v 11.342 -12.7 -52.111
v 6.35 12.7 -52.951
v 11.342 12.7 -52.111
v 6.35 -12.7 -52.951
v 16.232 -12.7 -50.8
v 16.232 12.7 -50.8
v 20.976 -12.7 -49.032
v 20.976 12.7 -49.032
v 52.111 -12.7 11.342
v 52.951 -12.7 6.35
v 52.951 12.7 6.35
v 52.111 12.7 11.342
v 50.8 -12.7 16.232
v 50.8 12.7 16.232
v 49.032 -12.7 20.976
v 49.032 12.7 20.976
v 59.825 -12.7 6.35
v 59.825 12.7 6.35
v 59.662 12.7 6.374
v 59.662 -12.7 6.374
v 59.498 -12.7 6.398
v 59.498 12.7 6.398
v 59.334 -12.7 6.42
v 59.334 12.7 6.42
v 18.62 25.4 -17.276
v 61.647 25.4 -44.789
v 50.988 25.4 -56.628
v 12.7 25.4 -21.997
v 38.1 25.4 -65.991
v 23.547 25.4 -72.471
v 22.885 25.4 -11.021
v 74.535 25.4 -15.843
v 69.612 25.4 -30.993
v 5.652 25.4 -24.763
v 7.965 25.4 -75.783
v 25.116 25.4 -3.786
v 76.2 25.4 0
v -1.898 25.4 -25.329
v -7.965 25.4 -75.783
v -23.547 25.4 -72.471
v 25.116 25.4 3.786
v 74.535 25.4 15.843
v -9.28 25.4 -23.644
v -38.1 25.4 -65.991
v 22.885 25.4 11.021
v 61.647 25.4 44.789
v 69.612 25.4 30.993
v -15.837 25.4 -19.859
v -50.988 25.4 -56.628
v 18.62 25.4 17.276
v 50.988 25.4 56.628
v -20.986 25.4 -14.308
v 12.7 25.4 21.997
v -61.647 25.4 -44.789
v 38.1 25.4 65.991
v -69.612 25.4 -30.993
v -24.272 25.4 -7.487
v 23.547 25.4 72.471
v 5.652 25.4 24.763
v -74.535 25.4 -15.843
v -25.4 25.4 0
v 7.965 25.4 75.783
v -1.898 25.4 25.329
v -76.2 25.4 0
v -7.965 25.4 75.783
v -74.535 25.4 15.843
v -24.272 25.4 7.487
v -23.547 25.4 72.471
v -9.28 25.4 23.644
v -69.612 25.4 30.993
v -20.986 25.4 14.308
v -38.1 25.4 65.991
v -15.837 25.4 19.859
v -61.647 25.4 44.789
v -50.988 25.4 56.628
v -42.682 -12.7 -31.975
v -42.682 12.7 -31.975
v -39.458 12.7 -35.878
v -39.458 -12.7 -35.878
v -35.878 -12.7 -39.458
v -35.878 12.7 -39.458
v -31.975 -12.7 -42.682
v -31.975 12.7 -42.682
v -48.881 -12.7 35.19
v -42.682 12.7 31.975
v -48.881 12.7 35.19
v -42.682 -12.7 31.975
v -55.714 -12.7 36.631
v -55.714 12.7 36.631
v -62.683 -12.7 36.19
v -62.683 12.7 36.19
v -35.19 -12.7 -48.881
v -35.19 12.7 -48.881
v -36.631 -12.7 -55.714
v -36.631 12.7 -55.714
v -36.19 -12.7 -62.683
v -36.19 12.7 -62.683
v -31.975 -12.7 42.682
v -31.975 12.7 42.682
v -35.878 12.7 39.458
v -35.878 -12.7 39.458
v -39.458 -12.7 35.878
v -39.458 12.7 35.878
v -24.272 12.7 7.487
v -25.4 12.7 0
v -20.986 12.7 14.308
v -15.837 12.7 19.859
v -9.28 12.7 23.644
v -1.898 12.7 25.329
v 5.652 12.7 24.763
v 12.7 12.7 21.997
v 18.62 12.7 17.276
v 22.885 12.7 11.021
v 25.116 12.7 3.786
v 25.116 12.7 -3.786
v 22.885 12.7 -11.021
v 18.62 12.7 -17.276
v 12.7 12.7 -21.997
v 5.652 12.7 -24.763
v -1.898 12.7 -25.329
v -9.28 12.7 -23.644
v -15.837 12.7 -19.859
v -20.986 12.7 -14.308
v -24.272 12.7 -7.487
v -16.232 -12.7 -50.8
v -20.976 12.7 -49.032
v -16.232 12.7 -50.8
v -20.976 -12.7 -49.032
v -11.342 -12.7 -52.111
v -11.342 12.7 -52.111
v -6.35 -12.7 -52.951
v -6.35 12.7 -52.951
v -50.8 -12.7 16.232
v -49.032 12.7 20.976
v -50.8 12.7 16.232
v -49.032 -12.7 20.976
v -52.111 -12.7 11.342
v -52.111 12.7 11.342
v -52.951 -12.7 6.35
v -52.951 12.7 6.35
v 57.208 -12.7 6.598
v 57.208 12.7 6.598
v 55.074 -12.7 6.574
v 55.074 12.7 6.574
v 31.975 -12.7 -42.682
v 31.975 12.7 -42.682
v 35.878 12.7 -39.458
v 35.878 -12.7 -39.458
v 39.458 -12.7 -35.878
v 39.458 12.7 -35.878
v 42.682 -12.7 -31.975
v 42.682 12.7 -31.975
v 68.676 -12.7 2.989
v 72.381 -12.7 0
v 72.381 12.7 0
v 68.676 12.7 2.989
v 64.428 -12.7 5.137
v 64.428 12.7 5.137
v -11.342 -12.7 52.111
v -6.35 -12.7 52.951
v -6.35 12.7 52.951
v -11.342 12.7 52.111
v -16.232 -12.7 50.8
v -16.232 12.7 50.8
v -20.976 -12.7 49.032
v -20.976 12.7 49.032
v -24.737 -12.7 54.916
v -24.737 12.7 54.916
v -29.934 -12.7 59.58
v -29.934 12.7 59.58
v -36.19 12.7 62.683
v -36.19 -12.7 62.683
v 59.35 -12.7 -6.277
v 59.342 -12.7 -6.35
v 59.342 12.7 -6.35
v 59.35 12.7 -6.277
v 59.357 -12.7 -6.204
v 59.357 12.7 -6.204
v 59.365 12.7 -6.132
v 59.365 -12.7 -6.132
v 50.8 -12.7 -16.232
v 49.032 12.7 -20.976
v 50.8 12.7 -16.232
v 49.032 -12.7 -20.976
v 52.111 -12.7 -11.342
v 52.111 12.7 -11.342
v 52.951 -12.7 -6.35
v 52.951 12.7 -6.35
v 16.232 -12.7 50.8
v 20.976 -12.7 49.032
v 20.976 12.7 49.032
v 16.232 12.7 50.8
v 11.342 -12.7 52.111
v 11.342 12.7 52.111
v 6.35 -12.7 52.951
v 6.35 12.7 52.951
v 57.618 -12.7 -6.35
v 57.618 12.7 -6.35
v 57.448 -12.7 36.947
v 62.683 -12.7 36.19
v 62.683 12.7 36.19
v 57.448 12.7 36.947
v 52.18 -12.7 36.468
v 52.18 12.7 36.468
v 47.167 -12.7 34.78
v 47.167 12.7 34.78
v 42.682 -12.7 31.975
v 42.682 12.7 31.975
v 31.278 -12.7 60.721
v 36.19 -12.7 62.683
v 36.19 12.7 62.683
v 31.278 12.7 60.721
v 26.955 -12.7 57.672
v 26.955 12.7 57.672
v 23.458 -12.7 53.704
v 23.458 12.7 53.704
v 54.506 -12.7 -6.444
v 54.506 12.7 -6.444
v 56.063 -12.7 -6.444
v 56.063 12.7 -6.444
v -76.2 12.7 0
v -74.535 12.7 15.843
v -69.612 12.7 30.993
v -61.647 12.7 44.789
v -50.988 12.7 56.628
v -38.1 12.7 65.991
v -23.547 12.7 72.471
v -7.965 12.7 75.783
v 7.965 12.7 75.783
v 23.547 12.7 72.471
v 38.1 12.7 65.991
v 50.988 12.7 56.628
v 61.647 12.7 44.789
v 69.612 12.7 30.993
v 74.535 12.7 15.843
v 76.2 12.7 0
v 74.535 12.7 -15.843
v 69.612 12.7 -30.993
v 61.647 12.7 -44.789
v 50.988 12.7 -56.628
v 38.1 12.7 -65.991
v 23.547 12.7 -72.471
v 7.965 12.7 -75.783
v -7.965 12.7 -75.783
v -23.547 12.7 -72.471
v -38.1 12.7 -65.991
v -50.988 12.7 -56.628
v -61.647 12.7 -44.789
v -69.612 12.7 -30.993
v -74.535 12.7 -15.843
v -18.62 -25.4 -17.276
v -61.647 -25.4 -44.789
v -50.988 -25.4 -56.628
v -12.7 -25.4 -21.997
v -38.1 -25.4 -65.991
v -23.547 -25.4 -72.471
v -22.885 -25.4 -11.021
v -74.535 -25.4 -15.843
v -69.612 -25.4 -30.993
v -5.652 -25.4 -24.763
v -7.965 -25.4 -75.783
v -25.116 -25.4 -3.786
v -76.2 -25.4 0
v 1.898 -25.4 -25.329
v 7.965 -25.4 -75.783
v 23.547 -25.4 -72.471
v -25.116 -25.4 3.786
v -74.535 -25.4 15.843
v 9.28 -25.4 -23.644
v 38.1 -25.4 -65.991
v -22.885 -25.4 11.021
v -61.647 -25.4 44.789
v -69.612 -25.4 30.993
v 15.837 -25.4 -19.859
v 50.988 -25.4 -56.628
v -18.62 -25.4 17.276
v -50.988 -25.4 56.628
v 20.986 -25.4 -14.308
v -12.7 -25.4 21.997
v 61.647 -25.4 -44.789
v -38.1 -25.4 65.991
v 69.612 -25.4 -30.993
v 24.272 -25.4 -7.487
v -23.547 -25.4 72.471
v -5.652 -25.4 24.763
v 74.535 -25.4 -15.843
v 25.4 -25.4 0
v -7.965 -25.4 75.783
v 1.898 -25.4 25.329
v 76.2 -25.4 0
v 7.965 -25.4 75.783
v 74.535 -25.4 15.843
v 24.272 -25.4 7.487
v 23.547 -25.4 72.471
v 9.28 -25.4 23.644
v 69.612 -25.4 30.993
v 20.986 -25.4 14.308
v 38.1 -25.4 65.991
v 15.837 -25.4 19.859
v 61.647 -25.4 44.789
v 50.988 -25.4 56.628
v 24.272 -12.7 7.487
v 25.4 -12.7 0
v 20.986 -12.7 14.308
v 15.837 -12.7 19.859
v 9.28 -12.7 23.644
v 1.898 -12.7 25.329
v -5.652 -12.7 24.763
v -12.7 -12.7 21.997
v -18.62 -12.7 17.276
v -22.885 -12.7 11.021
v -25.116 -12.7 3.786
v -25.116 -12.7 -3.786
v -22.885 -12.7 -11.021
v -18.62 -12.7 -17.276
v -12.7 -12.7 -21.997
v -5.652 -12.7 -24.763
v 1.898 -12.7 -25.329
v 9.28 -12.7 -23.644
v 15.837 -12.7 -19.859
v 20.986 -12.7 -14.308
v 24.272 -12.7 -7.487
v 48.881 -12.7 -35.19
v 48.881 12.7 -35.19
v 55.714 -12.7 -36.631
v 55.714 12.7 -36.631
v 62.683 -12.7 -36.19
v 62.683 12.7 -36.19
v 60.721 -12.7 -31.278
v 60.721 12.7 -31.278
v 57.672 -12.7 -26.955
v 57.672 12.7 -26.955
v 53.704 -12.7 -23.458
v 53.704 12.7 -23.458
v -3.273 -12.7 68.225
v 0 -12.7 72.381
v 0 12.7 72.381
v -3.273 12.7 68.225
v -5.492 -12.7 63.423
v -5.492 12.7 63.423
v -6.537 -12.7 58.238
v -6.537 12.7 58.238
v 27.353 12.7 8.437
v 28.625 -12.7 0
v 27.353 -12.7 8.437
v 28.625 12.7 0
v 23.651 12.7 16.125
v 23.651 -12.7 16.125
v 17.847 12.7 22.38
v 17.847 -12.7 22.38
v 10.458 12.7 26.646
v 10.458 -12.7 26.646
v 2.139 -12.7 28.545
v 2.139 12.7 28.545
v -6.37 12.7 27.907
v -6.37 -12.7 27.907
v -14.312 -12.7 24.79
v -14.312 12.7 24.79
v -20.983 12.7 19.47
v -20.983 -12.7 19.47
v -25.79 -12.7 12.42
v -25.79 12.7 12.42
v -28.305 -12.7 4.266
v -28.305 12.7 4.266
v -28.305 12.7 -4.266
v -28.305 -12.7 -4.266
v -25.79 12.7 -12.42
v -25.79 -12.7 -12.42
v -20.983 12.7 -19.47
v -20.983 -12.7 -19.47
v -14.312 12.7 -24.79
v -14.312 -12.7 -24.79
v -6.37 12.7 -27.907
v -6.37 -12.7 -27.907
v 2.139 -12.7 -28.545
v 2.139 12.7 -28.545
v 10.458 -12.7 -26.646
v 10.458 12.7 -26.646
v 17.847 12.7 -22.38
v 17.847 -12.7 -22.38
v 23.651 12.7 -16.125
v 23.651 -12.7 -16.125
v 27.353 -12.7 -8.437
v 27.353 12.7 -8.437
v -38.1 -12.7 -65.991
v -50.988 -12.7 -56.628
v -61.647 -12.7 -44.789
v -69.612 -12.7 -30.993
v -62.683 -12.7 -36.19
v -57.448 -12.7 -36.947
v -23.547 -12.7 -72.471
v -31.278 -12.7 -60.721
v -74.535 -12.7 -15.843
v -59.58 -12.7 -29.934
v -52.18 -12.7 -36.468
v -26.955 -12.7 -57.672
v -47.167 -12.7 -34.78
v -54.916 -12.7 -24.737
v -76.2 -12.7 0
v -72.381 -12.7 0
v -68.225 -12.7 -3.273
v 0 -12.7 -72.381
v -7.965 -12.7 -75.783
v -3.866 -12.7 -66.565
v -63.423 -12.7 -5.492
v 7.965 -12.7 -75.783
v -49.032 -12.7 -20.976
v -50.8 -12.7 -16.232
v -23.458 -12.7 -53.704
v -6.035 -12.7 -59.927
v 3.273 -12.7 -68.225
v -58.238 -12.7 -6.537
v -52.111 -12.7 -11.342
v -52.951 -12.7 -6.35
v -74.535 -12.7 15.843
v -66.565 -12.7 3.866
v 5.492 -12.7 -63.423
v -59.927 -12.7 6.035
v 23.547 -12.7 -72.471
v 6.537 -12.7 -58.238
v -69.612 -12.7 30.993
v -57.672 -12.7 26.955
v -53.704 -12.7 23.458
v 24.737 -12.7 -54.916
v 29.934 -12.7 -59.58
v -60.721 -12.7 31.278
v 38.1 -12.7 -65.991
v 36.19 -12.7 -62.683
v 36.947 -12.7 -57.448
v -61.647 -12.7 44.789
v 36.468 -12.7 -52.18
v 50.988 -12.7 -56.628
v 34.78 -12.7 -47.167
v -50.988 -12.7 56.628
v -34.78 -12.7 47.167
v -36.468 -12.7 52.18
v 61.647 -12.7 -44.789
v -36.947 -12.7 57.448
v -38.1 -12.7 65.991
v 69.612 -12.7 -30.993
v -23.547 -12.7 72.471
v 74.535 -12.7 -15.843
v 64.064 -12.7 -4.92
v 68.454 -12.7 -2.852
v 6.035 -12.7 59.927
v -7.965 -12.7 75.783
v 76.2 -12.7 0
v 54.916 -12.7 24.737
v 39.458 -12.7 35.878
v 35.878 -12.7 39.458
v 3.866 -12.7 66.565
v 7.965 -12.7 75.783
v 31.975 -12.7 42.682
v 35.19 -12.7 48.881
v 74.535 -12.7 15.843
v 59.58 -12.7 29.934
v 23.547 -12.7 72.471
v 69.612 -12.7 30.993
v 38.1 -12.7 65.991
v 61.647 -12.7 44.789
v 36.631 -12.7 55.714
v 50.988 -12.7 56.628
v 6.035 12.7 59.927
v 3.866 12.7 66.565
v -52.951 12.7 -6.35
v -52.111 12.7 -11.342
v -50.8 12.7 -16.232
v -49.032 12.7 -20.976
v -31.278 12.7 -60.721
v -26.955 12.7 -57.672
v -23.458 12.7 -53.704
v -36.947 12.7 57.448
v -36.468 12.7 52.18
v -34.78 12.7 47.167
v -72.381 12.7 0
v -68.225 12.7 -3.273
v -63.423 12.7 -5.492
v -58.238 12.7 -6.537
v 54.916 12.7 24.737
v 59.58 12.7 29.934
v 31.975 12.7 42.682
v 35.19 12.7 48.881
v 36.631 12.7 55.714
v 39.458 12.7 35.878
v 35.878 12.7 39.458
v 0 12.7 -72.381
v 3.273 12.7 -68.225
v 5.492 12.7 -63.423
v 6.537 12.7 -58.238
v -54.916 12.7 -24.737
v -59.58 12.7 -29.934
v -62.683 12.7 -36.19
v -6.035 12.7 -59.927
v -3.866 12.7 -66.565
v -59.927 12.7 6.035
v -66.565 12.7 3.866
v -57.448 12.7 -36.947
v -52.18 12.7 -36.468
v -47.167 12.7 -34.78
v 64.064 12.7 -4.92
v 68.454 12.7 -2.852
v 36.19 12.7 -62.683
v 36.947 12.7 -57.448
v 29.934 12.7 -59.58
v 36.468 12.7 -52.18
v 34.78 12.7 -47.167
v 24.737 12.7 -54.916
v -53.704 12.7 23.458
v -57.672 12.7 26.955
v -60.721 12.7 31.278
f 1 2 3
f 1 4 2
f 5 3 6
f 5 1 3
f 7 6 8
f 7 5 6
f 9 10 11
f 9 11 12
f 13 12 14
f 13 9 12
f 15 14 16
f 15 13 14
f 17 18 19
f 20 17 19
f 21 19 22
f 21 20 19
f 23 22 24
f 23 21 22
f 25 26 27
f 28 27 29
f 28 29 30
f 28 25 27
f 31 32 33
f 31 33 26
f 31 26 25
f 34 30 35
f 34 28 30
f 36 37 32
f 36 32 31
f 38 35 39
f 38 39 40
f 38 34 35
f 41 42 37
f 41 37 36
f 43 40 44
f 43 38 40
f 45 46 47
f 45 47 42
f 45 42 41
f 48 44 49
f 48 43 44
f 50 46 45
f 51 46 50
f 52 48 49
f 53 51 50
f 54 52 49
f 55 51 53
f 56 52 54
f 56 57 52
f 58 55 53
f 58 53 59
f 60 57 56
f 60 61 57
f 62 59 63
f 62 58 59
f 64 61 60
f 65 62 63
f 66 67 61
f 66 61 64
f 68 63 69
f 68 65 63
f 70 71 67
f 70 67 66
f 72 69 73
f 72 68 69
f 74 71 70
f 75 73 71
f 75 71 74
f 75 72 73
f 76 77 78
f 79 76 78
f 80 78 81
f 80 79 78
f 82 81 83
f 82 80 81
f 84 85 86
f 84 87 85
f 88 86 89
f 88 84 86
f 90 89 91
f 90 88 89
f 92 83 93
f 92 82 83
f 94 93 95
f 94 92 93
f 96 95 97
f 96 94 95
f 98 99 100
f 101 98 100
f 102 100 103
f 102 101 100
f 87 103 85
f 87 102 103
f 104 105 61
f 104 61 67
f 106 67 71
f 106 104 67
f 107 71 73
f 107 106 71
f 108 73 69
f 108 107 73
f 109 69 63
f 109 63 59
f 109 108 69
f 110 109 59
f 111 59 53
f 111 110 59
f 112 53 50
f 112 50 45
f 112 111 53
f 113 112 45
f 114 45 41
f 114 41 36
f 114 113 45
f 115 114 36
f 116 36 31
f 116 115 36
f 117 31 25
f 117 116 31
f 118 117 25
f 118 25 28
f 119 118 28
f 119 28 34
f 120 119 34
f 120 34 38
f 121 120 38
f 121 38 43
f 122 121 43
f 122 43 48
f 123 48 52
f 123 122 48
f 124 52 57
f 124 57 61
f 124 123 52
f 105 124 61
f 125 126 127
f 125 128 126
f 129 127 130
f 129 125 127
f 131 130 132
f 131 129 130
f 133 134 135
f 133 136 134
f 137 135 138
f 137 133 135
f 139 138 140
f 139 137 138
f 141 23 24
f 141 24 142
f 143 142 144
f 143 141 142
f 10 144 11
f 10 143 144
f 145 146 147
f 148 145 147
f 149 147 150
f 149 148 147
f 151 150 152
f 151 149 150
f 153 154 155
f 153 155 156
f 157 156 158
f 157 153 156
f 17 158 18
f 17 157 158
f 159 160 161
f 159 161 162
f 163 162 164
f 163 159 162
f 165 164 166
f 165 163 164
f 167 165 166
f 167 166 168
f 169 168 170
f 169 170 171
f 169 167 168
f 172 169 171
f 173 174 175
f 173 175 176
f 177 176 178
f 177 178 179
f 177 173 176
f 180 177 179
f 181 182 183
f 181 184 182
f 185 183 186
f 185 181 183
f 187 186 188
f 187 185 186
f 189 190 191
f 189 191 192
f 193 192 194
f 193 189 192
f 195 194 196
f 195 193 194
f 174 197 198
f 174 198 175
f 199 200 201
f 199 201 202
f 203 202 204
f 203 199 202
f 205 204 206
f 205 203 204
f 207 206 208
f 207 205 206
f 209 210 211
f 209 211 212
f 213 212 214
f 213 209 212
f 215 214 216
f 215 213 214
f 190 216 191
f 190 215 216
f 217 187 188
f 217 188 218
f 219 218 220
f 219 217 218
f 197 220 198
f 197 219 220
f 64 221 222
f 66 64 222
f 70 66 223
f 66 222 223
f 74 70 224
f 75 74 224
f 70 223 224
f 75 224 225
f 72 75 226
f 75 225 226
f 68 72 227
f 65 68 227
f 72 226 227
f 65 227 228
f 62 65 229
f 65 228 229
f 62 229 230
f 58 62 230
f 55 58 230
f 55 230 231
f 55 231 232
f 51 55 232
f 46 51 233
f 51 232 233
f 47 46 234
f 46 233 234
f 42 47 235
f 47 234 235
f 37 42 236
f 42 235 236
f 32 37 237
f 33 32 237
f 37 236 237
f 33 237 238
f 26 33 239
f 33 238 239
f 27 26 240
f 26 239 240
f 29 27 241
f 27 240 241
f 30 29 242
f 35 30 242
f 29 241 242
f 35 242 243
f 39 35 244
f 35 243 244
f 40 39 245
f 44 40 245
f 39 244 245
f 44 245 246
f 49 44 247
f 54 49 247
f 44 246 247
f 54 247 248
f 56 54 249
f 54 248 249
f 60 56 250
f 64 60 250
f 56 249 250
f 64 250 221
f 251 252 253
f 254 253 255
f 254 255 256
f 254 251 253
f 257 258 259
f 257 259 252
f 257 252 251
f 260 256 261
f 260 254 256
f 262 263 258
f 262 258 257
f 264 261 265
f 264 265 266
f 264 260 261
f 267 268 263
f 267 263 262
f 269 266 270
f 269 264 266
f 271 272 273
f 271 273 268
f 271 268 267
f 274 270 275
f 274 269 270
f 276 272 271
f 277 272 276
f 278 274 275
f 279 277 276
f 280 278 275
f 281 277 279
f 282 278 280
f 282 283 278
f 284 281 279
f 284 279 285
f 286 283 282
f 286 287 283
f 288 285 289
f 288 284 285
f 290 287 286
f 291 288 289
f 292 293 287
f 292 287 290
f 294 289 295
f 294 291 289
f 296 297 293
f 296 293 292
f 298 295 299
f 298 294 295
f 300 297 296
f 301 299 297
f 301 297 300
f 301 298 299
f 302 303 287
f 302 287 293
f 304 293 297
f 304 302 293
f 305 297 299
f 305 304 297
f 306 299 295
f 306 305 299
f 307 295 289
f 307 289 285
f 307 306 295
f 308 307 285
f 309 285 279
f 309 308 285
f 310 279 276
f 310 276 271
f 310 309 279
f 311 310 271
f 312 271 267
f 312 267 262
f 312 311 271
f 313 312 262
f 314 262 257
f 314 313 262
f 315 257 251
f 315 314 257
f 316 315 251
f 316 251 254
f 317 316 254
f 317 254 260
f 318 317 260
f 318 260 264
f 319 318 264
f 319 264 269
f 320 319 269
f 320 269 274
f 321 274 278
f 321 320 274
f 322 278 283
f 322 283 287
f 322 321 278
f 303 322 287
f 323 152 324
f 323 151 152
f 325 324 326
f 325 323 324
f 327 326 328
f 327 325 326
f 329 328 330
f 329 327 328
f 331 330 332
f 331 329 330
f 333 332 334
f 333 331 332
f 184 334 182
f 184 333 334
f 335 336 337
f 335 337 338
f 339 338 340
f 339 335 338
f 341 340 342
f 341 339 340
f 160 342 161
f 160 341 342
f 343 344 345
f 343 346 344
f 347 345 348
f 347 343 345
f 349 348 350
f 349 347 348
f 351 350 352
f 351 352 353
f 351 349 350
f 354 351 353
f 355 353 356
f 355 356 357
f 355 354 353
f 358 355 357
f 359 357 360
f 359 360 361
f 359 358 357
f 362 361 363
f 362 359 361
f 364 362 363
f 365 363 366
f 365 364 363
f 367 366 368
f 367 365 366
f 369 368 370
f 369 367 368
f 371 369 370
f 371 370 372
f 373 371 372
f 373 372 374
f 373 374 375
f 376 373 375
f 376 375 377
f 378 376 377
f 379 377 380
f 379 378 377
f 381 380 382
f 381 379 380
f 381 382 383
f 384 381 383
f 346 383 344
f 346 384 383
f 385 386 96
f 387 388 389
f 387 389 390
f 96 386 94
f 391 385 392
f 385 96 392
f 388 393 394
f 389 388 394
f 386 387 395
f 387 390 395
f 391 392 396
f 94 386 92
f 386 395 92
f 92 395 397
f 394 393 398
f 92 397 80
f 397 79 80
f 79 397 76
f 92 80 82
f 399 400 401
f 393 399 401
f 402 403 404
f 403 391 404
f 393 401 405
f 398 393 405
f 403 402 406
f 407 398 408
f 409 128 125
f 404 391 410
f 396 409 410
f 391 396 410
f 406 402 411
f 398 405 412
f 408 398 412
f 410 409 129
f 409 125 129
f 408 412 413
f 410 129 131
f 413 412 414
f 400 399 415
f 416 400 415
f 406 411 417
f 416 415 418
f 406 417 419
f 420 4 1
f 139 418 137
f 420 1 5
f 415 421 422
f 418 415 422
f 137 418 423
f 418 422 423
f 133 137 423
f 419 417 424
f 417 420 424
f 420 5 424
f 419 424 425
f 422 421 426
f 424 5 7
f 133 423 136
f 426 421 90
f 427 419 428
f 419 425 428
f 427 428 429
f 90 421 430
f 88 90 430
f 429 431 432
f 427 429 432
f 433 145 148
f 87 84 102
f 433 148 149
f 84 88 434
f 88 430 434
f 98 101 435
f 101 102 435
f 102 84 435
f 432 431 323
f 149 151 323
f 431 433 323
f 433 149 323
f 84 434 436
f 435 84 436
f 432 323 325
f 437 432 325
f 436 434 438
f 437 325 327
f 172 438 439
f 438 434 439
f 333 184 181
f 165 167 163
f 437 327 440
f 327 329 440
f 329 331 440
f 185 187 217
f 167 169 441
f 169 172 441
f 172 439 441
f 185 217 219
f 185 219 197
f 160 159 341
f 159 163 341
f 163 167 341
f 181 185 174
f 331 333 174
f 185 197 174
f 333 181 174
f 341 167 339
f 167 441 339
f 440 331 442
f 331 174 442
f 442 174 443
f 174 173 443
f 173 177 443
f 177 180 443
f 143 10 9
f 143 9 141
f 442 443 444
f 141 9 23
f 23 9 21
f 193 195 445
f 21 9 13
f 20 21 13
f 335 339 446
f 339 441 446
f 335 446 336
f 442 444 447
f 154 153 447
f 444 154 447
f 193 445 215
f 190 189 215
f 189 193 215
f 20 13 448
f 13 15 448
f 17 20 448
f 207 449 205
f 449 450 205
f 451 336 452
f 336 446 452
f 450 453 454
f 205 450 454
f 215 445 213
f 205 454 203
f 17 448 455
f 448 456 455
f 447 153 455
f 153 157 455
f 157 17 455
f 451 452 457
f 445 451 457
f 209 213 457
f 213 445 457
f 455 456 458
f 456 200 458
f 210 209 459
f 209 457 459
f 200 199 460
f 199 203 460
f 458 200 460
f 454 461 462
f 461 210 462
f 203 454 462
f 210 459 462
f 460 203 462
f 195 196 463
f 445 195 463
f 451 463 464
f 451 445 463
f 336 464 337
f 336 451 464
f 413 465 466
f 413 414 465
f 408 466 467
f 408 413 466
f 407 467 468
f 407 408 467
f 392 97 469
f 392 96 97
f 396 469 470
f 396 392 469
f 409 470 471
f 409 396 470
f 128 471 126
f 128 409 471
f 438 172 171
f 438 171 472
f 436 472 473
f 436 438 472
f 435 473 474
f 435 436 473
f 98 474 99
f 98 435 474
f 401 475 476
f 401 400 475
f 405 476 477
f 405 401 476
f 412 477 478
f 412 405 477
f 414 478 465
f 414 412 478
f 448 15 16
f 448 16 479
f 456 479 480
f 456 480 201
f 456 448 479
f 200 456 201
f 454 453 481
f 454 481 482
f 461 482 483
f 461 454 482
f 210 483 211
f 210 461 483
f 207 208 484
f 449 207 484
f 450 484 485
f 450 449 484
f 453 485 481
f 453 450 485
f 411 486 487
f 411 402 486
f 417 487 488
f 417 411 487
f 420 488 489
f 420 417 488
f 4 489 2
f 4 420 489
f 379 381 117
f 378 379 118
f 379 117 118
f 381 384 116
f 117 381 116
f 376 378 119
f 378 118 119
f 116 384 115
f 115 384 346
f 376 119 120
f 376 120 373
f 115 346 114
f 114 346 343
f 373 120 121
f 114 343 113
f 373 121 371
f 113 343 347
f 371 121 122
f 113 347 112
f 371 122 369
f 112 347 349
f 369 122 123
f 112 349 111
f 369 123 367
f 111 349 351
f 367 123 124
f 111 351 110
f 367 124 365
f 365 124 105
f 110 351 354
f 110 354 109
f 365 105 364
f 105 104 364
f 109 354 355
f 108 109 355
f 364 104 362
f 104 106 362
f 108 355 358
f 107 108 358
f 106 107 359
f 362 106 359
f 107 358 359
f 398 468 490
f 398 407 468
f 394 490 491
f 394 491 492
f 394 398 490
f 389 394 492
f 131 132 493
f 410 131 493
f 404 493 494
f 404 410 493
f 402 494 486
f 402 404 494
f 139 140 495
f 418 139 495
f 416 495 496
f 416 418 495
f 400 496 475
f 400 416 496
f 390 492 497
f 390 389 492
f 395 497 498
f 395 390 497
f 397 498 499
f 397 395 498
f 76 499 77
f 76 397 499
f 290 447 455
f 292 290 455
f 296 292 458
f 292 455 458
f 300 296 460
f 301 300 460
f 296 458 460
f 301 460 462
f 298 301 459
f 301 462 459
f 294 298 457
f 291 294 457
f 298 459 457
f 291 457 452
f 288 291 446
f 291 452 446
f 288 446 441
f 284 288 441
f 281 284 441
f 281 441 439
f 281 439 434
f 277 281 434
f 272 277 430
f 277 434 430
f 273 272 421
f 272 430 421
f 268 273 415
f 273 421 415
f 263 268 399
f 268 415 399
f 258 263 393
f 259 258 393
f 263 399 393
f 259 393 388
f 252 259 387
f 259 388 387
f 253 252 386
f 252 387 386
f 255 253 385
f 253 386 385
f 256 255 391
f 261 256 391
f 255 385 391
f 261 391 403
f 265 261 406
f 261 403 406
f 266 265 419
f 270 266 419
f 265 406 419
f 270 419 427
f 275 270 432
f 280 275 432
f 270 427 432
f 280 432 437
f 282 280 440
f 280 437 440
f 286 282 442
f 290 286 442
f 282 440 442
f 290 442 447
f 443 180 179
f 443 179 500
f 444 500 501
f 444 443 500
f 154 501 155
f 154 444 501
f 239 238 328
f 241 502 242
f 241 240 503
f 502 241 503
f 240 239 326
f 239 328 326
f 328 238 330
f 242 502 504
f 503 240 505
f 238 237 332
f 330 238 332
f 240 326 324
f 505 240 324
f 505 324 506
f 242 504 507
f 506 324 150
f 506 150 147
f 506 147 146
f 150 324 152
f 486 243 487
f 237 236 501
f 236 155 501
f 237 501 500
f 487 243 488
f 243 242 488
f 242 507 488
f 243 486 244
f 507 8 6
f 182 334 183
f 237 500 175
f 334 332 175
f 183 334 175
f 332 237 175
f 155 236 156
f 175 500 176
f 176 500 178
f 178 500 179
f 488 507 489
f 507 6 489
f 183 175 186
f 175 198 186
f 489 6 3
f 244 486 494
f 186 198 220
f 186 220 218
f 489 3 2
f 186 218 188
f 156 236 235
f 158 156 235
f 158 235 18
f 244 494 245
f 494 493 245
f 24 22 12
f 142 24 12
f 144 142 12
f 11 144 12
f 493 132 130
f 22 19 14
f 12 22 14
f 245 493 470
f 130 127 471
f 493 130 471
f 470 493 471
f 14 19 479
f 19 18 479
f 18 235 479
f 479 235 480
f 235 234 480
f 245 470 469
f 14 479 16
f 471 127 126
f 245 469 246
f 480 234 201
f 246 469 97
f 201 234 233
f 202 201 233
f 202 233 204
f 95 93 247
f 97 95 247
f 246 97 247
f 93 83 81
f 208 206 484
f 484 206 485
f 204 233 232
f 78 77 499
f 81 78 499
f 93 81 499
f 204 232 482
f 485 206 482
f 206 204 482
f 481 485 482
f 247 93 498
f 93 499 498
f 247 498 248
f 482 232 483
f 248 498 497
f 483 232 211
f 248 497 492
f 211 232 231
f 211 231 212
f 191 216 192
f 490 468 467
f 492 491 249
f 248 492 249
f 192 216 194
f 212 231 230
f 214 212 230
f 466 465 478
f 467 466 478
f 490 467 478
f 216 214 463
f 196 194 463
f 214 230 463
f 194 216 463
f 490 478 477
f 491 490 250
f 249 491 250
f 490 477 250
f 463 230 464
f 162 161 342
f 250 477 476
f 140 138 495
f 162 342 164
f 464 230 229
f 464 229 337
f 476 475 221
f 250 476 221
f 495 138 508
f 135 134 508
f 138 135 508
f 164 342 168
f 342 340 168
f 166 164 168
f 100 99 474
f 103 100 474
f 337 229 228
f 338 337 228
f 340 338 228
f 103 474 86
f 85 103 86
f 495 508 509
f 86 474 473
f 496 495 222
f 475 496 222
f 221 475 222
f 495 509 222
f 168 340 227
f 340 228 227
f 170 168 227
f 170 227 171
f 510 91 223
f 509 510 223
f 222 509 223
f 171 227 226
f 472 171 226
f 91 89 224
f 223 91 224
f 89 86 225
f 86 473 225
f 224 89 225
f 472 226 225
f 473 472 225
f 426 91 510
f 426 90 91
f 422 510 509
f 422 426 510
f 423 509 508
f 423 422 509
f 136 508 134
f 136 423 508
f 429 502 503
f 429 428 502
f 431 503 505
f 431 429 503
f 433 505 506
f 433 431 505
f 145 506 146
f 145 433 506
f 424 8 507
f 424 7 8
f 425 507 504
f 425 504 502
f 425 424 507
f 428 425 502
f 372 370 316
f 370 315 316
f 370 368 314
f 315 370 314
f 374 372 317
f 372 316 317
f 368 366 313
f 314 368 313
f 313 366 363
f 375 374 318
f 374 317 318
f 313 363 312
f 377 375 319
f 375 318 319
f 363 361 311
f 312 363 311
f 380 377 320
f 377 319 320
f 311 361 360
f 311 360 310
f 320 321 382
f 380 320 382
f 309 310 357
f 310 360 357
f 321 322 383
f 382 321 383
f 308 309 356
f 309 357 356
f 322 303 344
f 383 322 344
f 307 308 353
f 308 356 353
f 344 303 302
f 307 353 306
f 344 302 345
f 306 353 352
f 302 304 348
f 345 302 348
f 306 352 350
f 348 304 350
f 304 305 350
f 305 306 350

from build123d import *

# Parameters (mm, degrees)
F0_R     = 44.222485
F0_R_2   = 28.624765
F1_DEPTH = 12.7
F2_R     = 76.2
F2_R_2   = 25.4
F3_DEPTH = 12.7
F4_R     = 76.2
F4_R_2   = 25.4
F5_DEPTH = 12.7


with BuildPart() as f1:
    # F0 (on Front) → F1 (new body, symmetric)
    with BuildSketch(Plane.XZ):
        with BuildLine():
            ThreePointArc((52.951212, -6.35), (53.235671, -3.180662), (53.330604, 0))
            ThreePointArc((53.330604, 0), (53.235671, 3.180662), (52.951212, 6.35))
            ThreePointArc((52.951212, 6.35), (51.513408, 13.802976), (49.032095, 20.976345))
            ThreePointArc((49.032095, 20.976345), (46.185658, 26.665302), (42.682095, 31.974867))
            ThreePointArc((42.682095, 31.974867), (37.710432, 37.710432), (31.974867, 42.682095))
            ThreePointArc((31.974867, 42.682095), (26.665302, 46.185658), (20.976345, 49.032094))
            ThreePointArc((20.976345, 49.032094), (13.802976, 51.513408), (6.35, 52.951212))
            ThreePointArc((6.35, 52.951212), (0, 53.330604), (-6.35, 52.951212))
            ThreePointArc((-6.35, 52.951212), (-13.802976, 51.513408), (-20.976345, 49.032095))
            ThreePointArc((-20.976345, 49.032095), (-26.665302, 46.185658), (-31.974867, 42.682095))
            ThreePointArc((-31.974867, 42.682095), (-37.710432, 37.710432), (-42.682095, 31.974867))
            ThreePointArc((-42.682095, 31.974867), (-46.185658, 26.665302), (-49.032094, 20.976345))
            ThreePointArc((-49.032094, 20.976345), (-51.513408, 13.802976), (-52.951212, 6.35))
            ThreePointArc((-52.951212, 6.35), (-53.330604, 0), (-52.951212, -6.35))
            ThreePointArc((-52.951212, -6.35), (-51.513408, -13.802976), (-49.032095, -20.976345))
            ThreePointArc((-49.032095, -20.976345), (-46.185658, -26.665302), (-42.682095, -31.974867))
            ThreePointArc((-42.682095, -31.974867), (-37.710432, -37.710432), (-31.974867, -42.682095))
            ThreePointArc((-31.974867, -42.682095), (-26.665302, -46.185658), (-20.976345, -49.032094))
            ThreePointArc((-20.976345, -49.032094), (-13.802976, -51.513408), (-6.35, -52.951212))
            ThreePointArc((-6.35, -52.951212), (0, -53.330604), (6.35, -52.951212))
            ThreePointArc((6.35, -52.951212), (13.802976, -51.513408), (20.976345, -49.032095))
            ThreePointArc((20.976345, -49.032095), (26.665302, -46.185658), (31.974867, -42.682095))
            ThreePointArc((31.974867, -42.682095), (37.710432, -37.710432), (42.682095, -31.974867))
            ThreePointArc((42.682095, -31.974867), (46.185658, -26.665302), (49.032094, -20.976345))
            ThreePointArc((49.032094, -20.976345), (51.513408, -13.802976), (52.951212, -6.35))
        make_face()
        Circle(F0_R, mode=Mode.SUBTRACT)
        with BuildLine():
            Line((72.380604, 0), (53.330604, 0))
            ThreePointArc((53.330604, 0), (53.235671, -3.180662), (52.951212, -6.35))
            Line((52.951212, -6.35), (57.618118, -6.35))
            ThreePointArc((57.618118, -6.35), (58.493309, -6.255681), (59.364783, -6.131635))
            ThreePointArc((59.364783, -6.131635), (66.307622, -3.989055), (72.380604, 0))
        make_face()
        with BuildLine():
            ThreePointArc((52.951212, 6.35), (53.235671, 3.180662), (53.330604, 0))
            Line((53.330604, 0), (72.380604, 0))
            ThreePointArc((72.380604, 0), (66.608564, 4.174833), (59.825179, 6.35))
            Line((59.825179, 6.35), (59.341823, 6.35))
            ThreePointArc((59.341823, 6.35), (59.338073, 6.384943), (59.334303, 6.419883))
            ThreePointArc((59.334303, 6.419883), (56.140283, 6.610983), (52.951212, 6.35))
        make_face()
        with BuildLine():
            Line((57.618118, -6.35), (52.951212, -6.35))
            ThreePointArc((52.951212, -6.35), (55.284665, -6.455472), (57.618118, -6.35))
        make_face()
        with BuildLine():
            ThreePointArc((42.682095, 31.974867), (46.185658, 26.665302), (49.032095, 20.976345))
            ThreePointArc((49.032095, 20.976345), (57.424424, 27.177577), (62.683442, 36.190302))
            ThreePointArc((62.683442, 36.190302), (52.180088, 36.467695), (42.682095, 31.974867))
        make_face()
        with BuildLine():
            ThreePointArc((59.825179, 6.35), (59.579932, 6.386285), (59.334303, 6.419883))
            ThreePointArc((59.334303, 6.419883), (59.338073, 6.384943), (59.341823, 6.35))
            Line((59.341823, 6.35), (59.825179, 6.35))
        make_face()
        with BuildLine():
            ThreePointArc((62.683442, -36.190302), (57.671995, -26.955434), (49.032094, -20.976345))
            ThreePointArc((49.032094, -20.976345), (46.185658, -26.665302), (42.682095, -31.974867))
            ThreePointArc((42.682095, -31.974867), (52.248684, -36.142222), (62.683442, -36.190302))
        make_face()
        with BuildLine():
            ThreePointArc((59.364783, -6.131635), (58.493309, -6.255681), (57.618118, -6.35))
            Line((57.618118, -6.35), (59.341823, -6.35))
            ThreePointArc((59.341823, -6.35), (59.353403, -6.240828), (59.364783, -6.131635))
        make_face()
        with BuildLine():
            ThreePointArc((20.976345, 49.032094), (26.665302, 46.185658), (31.974867, 42.682095))
            ThreePointArc((31.974867, 42.682095), (36.142222, 52.248684), (36.190302, 62.683442))
            ThreePointArc((36.190302, 62.683442), (26.955434, 57.671995), (20.976345, 49.032094))
        make_face()
        with BuildLine():
            ThreePointArc((36.190302, -62.683442), (36.467695, -52.180088), (31.974867, -42.682095))
            ThreePointArc((31.974867, -42.682095), (26.665302, -46.185658), (20.976345, -49.032095))
            ThreePointArc((20.976345, -49.032095), (27.177577, -57.424424), (36.190302, -62.683442))
        make_face()
        with BuildLine():
            ThreePointArc((-6.35, 52.951212), (0, 53.330604), (6.35, 52.951212))
            ThreePointArc((6.35, 52.951212), (5.17574, 63.319798), (0, 72.380604))
            ThreePointArc((0, 72.380604), (-5.491907, 63.423129), (-6.35, 52.951212))
        make_face()
        with BuildLine():
            ThreePointArc((0, -72.380604), (5.491907, -63.423129), (6.35, -52.951212))
            ThreePointArc((6.35, -52.951212), (0, -53.330604), (-6.35, -52.951212))
            ThreePointArc((-6.35, -52.951212), (-5.17574, -63.319798), (0, -72.380604))
        make_face()
        with BuildLine():
            ThreePointArc((-31.974867, 42.682095), (-26.665302, 46.185658), (-20.976345, 49.032095))
            ThreePointArc((-20.976345, 49.032095), (-27.177577, 57.424424), (-36.190302, 62.683442))
            ThreePointArc((-36.190302, 62.683442), (-36.467695, 52.180088), (-31.974867, 42.682095))
        make_face()
        with BuildLine():
            ThreePointArc((-36.190302, -62.683442), (-26.955434, -57.671995), (-20.976345, -49.032094))
            ThreePointArc((-20.976345, -49.032094), (-26.665302, -46.185658), (-31.974867, -42.682095))
            ThreePointArc((-31.974867, -42.682095), (-36.142222, -52.248684), (-36.190302, -62.683442))
        make_face()
        with BuildLine():
            ThreePointArc((-49.032094, 20.976345), (-46.185658, 26.665302), (-42.682095, 31.974867))
            ThreePointArc((-42.682095, 31.974867), (-52.248684, 36.142222), (-62.683442, 36.190302))
            ThreePointArc((-62.683442, 36.190302), (-57.671995, 26.955434), (-49.032094, 20.976345))
        make_face()
        with BuildLine():
            ThreePointArc((-62.683442, -36.190302), (-52.180088, -36.467695), (-42.682095, -31.974867))
            ThreePointArc((-42.682095, -31.974867), (-46.185658, -26.665302), (-49.032095, -20.976345))
            ThreePointArc((-49.032095, -20.976345), (-57.424424, -27.177577), (-62.683442, -36.190302))
        make_face()
        with BuildLine():
            ThreePointArc((-52.951212, -6.35), (-53.330604, 0), (-52.951212, 6.35))
            ThreePointArc((-52.951212, 6.35), (-63.319798, 5.17574), (-72.380604, 0))
            ThreePointArc((-72.380604, 0), (-63.423129, -5.491907), (-52.951212, -6.35))
        make_face()
        Circle(F0_R)
        Circle(F0_R_2, mode=Mode.SUBTRACT)
    extrude(amount=F1_DEPTH, both=True)

    # F2 (on face) → F3 (join)
    with BuildSketch(Plane.XZ.offset(12.7)):
        Circle(F2_R)
        Circle(F2_R_2, mode=Mode.SUBTRACT)
    extrude(amount=F3_DEPTH)

    # F4 (on face) → F5 (join)
    with BuildSketch(Plane(origin=(0, 12.7, 0), x_dir=(-1, 0, 0), z_dir=(0, 1, 0))):
        Circle(F4_R)
        Circle(F4_R_2, mode=Mode.SUBTRACT)
    extrude(amount=F5_DEPTH)


solid = f1.part
